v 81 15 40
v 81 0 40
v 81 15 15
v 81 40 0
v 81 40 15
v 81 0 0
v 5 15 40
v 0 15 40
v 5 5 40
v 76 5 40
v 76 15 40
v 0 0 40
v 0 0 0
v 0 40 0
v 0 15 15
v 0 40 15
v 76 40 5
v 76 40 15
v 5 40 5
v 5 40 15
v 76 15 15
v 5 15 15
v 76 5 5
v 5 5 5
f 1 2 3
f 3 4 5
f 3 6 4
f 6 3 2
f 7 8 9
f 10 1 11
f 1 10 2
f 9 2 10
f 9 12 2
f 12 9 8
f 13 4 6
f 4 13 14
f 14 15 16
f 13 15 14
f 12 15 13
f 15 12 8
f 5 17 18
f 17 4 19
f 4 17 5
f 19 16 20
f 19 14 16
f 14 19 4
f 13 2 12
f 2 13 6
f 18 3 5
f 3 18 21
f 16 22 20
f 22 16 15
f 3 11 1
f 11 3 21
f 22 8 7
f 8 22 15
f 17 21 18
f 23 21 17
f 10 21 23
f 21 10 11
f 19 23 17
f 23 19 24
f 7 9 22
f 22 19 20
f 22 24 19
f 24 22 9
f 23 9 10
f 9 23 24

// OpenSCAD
w = 71;
l = 40;
into = 10;
t = 5;

difference(){
	cube([w+2*t,l,l]);
	translate([0,t+into,t+into])
	cube([w+2*t,l,l]);
	translate([t,t,t])
	cube([w,l,l]);

}
